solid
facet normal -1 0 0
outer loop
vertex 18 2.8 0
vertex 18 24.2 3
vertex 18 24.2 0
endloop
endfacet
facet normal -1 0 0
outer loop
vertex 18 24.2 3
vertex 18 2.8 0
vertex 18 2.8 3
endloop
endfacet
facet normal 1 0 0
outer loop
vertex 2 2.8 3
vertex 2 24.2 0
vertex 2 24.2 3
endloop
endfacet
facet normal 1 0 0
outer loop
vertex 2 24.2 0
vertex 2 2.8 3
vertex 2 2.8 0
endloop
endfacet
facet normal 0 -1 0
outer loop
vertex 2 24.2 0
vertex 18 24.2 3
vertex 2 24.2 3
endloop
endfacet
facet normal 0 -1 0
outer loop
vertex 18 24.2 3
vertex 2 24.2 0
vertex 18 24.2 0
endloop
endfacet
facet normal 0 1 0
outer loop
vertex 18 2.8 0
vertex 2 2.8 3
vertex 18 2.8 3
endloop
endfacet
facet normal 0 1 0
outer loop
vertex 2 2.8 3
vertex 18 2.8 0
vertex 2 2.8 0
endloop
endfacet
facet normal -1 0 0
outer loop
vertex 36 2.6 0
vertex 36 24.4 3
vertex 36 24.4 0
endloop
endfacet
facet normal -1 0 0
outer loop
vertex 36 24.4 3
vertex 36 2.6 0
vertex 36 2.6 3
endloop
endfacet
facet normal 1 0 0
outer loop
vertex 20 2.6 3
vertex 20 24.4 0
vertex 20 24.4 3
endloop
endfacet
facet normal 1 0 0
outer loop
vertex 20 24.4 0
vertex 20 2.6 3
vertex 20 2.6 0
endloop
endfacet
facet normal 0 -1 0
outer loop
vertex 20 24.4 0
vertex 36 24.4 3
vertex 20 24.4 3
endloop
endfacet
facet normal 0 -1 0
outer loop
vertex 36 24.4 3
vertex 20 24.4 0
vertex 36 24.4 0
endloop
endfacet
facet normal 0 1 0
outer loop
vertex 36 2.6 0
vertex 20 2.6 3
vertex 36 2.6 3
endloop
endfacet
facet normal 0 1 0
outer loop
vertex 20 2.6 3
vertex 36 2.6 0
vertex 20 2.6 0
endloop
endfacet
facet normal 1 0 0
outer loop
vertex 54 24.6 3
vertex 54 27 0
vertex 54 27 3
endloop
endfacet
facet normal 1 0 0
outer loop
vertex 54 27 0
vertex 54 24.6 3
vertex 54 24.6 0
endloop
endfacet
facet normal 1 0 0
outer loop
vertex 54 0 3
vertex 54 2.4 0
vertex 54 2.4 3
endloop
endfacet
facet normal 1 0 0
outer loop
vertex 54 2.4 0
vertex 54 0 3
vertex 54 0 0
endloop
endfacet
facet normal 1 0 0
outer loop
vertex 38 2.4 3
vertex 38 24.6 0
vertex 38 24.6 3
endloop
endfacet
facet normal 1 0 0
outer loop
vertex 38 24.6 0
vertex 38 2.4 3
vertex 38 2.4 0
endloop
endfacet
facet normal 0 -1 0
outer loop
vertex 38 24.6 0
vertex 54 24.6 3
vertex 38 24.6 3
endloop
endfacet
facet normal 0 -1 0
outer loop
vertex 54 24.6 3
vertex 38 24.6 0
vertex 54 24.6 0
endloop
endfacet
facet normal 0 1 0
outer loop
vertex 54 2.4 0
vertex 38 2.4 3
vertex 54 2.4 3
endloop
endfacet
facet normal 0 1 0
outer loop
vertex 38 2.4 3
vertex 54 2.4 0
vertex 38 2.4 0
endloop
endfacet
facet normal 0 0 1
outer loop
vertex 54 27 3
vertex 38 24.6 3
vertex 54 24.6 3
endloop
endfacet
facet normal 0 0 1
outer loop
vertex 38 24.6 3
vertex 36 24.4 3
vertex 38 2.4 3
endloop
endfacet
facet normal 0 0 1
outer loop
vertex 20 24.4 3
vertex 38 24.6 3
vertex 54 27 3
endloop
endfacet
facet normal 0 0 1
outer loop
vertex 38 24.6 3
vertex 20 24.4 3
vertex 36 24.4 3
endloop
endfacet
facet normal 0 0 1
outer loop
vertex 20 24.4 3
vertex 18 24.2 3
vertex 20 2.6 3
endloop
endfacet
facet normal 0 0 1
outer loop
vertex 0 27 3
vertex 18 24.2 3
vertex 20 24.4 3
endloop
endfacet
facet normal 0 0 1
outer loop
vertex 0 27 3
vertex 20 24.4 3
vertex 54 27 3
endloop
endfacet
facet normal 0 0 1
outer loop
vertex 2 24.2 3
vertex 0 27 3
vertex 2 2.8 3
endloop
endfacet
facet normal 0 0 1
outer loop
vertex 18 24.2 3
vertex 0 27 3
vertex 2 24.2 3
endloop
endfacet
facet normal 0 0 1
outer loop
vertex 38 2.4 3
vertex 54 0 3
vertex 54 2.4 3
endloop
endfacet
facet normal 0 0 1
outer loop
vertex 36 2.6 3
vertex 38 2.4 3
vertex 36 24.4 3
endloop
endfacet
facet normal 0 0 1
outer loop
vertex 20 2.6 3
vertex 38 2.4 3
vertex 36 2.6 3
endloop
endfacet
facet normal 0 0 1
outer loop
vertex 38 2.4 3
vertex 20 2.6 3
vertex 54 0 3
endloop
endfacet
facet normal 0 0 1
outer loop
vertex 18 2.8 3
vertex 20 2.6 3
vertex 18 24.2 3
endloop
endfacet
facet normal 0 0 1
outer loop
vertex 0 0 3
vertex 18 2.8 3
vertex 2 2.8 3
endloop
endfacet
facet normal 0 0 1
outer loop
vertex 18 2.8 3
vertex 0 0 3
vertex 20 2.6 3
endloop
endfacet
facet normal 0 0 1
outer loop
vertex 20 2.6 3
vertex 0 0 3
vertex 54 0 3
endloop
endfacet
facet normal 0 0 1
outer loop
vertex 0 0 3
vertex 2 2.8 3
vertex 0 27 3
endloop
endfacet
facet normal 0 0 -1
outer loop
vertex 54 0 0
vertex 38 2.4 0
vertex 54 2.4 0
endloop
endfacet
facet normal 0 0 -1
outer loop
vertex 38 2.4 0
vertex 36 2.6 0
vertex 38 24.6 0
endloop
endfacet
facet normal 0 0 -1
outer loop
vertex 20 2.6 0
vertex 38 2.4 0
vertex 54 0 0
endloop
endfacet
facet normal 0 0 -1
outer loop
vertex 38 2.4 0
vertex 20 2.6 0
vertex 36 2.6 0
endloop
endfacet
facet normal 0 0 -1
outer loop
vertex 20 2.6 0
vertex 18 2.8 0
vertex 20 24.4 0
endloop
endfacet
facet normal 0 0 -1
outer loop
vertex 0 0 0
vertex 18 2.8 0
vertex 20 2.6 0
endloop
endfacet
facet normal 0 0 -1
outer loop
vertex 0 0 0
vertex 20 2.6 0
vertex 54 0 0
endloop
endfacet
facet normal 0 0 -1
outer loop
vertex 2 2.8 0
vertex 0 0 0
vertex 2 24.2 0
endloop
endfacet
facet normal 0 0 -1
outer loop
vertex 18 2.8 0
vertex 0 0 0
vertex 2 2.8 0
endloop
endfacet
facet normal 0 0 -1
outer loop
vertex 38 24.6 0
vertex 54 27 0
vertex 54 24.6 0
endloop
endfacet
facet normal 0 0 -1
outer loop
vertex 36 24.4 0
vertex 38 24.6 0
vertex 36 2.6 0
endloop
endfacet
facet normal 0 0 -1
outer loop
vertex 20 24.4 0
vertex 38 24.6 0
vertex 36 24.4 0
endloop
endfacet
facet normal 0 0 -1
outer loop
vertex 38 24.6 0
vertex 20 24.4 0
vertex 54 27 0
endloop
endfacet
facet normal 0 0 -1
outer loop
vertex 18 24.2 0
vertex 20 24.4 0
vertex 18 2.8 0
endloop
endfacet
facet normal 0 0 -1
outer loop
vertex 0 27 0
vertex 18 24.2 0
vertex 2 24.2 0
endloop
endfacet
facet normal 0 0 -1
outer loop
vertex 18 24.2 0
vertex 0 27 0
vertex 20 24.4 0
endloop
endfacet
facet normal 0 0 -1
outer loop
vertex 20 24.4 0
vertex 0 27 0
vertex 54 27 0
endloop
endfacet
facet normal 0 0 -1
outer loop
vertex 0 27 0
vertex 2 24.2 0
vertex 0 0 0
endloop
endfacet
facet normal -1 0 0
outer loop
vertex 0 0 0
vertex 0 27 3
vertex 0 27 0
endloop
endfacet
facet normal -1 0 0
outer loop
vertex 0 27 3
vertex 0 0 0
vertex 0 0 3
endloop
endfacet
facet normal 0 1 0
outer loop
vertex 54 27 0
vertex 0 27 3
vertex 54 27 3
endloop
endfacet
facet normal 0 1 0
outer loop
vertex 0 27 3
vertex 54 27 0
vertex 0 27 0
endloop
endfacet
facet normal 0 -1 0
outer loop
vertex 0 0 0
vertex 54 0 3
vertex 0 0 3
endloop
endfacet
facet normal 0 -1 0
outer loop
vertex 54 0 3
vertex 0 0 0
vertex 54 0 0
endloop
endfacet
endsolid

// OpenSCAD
// Print this small fit coupon before the full case if your printer is uncalibrated.
// Three through-slots check 21.4, 21.8, and 22.2 mm clear widths for the Pico's 21 mm PCB.
slot_widths=[21.4,21.8,22.2];
coupon_x=54; coupon_y=27; coupon_z=3; slot_x=16;
difference() {
  cube([coupon_x,coupon_y,coupon_z]);
  for(i=[0:2]) {
    x0=2+i*18;
    w=slot_widths[i];
    translate([x0,(coupon_y-w)/2,-0.1]) cube([slot_x,w,coupon_z+0.2]);
  }
}
